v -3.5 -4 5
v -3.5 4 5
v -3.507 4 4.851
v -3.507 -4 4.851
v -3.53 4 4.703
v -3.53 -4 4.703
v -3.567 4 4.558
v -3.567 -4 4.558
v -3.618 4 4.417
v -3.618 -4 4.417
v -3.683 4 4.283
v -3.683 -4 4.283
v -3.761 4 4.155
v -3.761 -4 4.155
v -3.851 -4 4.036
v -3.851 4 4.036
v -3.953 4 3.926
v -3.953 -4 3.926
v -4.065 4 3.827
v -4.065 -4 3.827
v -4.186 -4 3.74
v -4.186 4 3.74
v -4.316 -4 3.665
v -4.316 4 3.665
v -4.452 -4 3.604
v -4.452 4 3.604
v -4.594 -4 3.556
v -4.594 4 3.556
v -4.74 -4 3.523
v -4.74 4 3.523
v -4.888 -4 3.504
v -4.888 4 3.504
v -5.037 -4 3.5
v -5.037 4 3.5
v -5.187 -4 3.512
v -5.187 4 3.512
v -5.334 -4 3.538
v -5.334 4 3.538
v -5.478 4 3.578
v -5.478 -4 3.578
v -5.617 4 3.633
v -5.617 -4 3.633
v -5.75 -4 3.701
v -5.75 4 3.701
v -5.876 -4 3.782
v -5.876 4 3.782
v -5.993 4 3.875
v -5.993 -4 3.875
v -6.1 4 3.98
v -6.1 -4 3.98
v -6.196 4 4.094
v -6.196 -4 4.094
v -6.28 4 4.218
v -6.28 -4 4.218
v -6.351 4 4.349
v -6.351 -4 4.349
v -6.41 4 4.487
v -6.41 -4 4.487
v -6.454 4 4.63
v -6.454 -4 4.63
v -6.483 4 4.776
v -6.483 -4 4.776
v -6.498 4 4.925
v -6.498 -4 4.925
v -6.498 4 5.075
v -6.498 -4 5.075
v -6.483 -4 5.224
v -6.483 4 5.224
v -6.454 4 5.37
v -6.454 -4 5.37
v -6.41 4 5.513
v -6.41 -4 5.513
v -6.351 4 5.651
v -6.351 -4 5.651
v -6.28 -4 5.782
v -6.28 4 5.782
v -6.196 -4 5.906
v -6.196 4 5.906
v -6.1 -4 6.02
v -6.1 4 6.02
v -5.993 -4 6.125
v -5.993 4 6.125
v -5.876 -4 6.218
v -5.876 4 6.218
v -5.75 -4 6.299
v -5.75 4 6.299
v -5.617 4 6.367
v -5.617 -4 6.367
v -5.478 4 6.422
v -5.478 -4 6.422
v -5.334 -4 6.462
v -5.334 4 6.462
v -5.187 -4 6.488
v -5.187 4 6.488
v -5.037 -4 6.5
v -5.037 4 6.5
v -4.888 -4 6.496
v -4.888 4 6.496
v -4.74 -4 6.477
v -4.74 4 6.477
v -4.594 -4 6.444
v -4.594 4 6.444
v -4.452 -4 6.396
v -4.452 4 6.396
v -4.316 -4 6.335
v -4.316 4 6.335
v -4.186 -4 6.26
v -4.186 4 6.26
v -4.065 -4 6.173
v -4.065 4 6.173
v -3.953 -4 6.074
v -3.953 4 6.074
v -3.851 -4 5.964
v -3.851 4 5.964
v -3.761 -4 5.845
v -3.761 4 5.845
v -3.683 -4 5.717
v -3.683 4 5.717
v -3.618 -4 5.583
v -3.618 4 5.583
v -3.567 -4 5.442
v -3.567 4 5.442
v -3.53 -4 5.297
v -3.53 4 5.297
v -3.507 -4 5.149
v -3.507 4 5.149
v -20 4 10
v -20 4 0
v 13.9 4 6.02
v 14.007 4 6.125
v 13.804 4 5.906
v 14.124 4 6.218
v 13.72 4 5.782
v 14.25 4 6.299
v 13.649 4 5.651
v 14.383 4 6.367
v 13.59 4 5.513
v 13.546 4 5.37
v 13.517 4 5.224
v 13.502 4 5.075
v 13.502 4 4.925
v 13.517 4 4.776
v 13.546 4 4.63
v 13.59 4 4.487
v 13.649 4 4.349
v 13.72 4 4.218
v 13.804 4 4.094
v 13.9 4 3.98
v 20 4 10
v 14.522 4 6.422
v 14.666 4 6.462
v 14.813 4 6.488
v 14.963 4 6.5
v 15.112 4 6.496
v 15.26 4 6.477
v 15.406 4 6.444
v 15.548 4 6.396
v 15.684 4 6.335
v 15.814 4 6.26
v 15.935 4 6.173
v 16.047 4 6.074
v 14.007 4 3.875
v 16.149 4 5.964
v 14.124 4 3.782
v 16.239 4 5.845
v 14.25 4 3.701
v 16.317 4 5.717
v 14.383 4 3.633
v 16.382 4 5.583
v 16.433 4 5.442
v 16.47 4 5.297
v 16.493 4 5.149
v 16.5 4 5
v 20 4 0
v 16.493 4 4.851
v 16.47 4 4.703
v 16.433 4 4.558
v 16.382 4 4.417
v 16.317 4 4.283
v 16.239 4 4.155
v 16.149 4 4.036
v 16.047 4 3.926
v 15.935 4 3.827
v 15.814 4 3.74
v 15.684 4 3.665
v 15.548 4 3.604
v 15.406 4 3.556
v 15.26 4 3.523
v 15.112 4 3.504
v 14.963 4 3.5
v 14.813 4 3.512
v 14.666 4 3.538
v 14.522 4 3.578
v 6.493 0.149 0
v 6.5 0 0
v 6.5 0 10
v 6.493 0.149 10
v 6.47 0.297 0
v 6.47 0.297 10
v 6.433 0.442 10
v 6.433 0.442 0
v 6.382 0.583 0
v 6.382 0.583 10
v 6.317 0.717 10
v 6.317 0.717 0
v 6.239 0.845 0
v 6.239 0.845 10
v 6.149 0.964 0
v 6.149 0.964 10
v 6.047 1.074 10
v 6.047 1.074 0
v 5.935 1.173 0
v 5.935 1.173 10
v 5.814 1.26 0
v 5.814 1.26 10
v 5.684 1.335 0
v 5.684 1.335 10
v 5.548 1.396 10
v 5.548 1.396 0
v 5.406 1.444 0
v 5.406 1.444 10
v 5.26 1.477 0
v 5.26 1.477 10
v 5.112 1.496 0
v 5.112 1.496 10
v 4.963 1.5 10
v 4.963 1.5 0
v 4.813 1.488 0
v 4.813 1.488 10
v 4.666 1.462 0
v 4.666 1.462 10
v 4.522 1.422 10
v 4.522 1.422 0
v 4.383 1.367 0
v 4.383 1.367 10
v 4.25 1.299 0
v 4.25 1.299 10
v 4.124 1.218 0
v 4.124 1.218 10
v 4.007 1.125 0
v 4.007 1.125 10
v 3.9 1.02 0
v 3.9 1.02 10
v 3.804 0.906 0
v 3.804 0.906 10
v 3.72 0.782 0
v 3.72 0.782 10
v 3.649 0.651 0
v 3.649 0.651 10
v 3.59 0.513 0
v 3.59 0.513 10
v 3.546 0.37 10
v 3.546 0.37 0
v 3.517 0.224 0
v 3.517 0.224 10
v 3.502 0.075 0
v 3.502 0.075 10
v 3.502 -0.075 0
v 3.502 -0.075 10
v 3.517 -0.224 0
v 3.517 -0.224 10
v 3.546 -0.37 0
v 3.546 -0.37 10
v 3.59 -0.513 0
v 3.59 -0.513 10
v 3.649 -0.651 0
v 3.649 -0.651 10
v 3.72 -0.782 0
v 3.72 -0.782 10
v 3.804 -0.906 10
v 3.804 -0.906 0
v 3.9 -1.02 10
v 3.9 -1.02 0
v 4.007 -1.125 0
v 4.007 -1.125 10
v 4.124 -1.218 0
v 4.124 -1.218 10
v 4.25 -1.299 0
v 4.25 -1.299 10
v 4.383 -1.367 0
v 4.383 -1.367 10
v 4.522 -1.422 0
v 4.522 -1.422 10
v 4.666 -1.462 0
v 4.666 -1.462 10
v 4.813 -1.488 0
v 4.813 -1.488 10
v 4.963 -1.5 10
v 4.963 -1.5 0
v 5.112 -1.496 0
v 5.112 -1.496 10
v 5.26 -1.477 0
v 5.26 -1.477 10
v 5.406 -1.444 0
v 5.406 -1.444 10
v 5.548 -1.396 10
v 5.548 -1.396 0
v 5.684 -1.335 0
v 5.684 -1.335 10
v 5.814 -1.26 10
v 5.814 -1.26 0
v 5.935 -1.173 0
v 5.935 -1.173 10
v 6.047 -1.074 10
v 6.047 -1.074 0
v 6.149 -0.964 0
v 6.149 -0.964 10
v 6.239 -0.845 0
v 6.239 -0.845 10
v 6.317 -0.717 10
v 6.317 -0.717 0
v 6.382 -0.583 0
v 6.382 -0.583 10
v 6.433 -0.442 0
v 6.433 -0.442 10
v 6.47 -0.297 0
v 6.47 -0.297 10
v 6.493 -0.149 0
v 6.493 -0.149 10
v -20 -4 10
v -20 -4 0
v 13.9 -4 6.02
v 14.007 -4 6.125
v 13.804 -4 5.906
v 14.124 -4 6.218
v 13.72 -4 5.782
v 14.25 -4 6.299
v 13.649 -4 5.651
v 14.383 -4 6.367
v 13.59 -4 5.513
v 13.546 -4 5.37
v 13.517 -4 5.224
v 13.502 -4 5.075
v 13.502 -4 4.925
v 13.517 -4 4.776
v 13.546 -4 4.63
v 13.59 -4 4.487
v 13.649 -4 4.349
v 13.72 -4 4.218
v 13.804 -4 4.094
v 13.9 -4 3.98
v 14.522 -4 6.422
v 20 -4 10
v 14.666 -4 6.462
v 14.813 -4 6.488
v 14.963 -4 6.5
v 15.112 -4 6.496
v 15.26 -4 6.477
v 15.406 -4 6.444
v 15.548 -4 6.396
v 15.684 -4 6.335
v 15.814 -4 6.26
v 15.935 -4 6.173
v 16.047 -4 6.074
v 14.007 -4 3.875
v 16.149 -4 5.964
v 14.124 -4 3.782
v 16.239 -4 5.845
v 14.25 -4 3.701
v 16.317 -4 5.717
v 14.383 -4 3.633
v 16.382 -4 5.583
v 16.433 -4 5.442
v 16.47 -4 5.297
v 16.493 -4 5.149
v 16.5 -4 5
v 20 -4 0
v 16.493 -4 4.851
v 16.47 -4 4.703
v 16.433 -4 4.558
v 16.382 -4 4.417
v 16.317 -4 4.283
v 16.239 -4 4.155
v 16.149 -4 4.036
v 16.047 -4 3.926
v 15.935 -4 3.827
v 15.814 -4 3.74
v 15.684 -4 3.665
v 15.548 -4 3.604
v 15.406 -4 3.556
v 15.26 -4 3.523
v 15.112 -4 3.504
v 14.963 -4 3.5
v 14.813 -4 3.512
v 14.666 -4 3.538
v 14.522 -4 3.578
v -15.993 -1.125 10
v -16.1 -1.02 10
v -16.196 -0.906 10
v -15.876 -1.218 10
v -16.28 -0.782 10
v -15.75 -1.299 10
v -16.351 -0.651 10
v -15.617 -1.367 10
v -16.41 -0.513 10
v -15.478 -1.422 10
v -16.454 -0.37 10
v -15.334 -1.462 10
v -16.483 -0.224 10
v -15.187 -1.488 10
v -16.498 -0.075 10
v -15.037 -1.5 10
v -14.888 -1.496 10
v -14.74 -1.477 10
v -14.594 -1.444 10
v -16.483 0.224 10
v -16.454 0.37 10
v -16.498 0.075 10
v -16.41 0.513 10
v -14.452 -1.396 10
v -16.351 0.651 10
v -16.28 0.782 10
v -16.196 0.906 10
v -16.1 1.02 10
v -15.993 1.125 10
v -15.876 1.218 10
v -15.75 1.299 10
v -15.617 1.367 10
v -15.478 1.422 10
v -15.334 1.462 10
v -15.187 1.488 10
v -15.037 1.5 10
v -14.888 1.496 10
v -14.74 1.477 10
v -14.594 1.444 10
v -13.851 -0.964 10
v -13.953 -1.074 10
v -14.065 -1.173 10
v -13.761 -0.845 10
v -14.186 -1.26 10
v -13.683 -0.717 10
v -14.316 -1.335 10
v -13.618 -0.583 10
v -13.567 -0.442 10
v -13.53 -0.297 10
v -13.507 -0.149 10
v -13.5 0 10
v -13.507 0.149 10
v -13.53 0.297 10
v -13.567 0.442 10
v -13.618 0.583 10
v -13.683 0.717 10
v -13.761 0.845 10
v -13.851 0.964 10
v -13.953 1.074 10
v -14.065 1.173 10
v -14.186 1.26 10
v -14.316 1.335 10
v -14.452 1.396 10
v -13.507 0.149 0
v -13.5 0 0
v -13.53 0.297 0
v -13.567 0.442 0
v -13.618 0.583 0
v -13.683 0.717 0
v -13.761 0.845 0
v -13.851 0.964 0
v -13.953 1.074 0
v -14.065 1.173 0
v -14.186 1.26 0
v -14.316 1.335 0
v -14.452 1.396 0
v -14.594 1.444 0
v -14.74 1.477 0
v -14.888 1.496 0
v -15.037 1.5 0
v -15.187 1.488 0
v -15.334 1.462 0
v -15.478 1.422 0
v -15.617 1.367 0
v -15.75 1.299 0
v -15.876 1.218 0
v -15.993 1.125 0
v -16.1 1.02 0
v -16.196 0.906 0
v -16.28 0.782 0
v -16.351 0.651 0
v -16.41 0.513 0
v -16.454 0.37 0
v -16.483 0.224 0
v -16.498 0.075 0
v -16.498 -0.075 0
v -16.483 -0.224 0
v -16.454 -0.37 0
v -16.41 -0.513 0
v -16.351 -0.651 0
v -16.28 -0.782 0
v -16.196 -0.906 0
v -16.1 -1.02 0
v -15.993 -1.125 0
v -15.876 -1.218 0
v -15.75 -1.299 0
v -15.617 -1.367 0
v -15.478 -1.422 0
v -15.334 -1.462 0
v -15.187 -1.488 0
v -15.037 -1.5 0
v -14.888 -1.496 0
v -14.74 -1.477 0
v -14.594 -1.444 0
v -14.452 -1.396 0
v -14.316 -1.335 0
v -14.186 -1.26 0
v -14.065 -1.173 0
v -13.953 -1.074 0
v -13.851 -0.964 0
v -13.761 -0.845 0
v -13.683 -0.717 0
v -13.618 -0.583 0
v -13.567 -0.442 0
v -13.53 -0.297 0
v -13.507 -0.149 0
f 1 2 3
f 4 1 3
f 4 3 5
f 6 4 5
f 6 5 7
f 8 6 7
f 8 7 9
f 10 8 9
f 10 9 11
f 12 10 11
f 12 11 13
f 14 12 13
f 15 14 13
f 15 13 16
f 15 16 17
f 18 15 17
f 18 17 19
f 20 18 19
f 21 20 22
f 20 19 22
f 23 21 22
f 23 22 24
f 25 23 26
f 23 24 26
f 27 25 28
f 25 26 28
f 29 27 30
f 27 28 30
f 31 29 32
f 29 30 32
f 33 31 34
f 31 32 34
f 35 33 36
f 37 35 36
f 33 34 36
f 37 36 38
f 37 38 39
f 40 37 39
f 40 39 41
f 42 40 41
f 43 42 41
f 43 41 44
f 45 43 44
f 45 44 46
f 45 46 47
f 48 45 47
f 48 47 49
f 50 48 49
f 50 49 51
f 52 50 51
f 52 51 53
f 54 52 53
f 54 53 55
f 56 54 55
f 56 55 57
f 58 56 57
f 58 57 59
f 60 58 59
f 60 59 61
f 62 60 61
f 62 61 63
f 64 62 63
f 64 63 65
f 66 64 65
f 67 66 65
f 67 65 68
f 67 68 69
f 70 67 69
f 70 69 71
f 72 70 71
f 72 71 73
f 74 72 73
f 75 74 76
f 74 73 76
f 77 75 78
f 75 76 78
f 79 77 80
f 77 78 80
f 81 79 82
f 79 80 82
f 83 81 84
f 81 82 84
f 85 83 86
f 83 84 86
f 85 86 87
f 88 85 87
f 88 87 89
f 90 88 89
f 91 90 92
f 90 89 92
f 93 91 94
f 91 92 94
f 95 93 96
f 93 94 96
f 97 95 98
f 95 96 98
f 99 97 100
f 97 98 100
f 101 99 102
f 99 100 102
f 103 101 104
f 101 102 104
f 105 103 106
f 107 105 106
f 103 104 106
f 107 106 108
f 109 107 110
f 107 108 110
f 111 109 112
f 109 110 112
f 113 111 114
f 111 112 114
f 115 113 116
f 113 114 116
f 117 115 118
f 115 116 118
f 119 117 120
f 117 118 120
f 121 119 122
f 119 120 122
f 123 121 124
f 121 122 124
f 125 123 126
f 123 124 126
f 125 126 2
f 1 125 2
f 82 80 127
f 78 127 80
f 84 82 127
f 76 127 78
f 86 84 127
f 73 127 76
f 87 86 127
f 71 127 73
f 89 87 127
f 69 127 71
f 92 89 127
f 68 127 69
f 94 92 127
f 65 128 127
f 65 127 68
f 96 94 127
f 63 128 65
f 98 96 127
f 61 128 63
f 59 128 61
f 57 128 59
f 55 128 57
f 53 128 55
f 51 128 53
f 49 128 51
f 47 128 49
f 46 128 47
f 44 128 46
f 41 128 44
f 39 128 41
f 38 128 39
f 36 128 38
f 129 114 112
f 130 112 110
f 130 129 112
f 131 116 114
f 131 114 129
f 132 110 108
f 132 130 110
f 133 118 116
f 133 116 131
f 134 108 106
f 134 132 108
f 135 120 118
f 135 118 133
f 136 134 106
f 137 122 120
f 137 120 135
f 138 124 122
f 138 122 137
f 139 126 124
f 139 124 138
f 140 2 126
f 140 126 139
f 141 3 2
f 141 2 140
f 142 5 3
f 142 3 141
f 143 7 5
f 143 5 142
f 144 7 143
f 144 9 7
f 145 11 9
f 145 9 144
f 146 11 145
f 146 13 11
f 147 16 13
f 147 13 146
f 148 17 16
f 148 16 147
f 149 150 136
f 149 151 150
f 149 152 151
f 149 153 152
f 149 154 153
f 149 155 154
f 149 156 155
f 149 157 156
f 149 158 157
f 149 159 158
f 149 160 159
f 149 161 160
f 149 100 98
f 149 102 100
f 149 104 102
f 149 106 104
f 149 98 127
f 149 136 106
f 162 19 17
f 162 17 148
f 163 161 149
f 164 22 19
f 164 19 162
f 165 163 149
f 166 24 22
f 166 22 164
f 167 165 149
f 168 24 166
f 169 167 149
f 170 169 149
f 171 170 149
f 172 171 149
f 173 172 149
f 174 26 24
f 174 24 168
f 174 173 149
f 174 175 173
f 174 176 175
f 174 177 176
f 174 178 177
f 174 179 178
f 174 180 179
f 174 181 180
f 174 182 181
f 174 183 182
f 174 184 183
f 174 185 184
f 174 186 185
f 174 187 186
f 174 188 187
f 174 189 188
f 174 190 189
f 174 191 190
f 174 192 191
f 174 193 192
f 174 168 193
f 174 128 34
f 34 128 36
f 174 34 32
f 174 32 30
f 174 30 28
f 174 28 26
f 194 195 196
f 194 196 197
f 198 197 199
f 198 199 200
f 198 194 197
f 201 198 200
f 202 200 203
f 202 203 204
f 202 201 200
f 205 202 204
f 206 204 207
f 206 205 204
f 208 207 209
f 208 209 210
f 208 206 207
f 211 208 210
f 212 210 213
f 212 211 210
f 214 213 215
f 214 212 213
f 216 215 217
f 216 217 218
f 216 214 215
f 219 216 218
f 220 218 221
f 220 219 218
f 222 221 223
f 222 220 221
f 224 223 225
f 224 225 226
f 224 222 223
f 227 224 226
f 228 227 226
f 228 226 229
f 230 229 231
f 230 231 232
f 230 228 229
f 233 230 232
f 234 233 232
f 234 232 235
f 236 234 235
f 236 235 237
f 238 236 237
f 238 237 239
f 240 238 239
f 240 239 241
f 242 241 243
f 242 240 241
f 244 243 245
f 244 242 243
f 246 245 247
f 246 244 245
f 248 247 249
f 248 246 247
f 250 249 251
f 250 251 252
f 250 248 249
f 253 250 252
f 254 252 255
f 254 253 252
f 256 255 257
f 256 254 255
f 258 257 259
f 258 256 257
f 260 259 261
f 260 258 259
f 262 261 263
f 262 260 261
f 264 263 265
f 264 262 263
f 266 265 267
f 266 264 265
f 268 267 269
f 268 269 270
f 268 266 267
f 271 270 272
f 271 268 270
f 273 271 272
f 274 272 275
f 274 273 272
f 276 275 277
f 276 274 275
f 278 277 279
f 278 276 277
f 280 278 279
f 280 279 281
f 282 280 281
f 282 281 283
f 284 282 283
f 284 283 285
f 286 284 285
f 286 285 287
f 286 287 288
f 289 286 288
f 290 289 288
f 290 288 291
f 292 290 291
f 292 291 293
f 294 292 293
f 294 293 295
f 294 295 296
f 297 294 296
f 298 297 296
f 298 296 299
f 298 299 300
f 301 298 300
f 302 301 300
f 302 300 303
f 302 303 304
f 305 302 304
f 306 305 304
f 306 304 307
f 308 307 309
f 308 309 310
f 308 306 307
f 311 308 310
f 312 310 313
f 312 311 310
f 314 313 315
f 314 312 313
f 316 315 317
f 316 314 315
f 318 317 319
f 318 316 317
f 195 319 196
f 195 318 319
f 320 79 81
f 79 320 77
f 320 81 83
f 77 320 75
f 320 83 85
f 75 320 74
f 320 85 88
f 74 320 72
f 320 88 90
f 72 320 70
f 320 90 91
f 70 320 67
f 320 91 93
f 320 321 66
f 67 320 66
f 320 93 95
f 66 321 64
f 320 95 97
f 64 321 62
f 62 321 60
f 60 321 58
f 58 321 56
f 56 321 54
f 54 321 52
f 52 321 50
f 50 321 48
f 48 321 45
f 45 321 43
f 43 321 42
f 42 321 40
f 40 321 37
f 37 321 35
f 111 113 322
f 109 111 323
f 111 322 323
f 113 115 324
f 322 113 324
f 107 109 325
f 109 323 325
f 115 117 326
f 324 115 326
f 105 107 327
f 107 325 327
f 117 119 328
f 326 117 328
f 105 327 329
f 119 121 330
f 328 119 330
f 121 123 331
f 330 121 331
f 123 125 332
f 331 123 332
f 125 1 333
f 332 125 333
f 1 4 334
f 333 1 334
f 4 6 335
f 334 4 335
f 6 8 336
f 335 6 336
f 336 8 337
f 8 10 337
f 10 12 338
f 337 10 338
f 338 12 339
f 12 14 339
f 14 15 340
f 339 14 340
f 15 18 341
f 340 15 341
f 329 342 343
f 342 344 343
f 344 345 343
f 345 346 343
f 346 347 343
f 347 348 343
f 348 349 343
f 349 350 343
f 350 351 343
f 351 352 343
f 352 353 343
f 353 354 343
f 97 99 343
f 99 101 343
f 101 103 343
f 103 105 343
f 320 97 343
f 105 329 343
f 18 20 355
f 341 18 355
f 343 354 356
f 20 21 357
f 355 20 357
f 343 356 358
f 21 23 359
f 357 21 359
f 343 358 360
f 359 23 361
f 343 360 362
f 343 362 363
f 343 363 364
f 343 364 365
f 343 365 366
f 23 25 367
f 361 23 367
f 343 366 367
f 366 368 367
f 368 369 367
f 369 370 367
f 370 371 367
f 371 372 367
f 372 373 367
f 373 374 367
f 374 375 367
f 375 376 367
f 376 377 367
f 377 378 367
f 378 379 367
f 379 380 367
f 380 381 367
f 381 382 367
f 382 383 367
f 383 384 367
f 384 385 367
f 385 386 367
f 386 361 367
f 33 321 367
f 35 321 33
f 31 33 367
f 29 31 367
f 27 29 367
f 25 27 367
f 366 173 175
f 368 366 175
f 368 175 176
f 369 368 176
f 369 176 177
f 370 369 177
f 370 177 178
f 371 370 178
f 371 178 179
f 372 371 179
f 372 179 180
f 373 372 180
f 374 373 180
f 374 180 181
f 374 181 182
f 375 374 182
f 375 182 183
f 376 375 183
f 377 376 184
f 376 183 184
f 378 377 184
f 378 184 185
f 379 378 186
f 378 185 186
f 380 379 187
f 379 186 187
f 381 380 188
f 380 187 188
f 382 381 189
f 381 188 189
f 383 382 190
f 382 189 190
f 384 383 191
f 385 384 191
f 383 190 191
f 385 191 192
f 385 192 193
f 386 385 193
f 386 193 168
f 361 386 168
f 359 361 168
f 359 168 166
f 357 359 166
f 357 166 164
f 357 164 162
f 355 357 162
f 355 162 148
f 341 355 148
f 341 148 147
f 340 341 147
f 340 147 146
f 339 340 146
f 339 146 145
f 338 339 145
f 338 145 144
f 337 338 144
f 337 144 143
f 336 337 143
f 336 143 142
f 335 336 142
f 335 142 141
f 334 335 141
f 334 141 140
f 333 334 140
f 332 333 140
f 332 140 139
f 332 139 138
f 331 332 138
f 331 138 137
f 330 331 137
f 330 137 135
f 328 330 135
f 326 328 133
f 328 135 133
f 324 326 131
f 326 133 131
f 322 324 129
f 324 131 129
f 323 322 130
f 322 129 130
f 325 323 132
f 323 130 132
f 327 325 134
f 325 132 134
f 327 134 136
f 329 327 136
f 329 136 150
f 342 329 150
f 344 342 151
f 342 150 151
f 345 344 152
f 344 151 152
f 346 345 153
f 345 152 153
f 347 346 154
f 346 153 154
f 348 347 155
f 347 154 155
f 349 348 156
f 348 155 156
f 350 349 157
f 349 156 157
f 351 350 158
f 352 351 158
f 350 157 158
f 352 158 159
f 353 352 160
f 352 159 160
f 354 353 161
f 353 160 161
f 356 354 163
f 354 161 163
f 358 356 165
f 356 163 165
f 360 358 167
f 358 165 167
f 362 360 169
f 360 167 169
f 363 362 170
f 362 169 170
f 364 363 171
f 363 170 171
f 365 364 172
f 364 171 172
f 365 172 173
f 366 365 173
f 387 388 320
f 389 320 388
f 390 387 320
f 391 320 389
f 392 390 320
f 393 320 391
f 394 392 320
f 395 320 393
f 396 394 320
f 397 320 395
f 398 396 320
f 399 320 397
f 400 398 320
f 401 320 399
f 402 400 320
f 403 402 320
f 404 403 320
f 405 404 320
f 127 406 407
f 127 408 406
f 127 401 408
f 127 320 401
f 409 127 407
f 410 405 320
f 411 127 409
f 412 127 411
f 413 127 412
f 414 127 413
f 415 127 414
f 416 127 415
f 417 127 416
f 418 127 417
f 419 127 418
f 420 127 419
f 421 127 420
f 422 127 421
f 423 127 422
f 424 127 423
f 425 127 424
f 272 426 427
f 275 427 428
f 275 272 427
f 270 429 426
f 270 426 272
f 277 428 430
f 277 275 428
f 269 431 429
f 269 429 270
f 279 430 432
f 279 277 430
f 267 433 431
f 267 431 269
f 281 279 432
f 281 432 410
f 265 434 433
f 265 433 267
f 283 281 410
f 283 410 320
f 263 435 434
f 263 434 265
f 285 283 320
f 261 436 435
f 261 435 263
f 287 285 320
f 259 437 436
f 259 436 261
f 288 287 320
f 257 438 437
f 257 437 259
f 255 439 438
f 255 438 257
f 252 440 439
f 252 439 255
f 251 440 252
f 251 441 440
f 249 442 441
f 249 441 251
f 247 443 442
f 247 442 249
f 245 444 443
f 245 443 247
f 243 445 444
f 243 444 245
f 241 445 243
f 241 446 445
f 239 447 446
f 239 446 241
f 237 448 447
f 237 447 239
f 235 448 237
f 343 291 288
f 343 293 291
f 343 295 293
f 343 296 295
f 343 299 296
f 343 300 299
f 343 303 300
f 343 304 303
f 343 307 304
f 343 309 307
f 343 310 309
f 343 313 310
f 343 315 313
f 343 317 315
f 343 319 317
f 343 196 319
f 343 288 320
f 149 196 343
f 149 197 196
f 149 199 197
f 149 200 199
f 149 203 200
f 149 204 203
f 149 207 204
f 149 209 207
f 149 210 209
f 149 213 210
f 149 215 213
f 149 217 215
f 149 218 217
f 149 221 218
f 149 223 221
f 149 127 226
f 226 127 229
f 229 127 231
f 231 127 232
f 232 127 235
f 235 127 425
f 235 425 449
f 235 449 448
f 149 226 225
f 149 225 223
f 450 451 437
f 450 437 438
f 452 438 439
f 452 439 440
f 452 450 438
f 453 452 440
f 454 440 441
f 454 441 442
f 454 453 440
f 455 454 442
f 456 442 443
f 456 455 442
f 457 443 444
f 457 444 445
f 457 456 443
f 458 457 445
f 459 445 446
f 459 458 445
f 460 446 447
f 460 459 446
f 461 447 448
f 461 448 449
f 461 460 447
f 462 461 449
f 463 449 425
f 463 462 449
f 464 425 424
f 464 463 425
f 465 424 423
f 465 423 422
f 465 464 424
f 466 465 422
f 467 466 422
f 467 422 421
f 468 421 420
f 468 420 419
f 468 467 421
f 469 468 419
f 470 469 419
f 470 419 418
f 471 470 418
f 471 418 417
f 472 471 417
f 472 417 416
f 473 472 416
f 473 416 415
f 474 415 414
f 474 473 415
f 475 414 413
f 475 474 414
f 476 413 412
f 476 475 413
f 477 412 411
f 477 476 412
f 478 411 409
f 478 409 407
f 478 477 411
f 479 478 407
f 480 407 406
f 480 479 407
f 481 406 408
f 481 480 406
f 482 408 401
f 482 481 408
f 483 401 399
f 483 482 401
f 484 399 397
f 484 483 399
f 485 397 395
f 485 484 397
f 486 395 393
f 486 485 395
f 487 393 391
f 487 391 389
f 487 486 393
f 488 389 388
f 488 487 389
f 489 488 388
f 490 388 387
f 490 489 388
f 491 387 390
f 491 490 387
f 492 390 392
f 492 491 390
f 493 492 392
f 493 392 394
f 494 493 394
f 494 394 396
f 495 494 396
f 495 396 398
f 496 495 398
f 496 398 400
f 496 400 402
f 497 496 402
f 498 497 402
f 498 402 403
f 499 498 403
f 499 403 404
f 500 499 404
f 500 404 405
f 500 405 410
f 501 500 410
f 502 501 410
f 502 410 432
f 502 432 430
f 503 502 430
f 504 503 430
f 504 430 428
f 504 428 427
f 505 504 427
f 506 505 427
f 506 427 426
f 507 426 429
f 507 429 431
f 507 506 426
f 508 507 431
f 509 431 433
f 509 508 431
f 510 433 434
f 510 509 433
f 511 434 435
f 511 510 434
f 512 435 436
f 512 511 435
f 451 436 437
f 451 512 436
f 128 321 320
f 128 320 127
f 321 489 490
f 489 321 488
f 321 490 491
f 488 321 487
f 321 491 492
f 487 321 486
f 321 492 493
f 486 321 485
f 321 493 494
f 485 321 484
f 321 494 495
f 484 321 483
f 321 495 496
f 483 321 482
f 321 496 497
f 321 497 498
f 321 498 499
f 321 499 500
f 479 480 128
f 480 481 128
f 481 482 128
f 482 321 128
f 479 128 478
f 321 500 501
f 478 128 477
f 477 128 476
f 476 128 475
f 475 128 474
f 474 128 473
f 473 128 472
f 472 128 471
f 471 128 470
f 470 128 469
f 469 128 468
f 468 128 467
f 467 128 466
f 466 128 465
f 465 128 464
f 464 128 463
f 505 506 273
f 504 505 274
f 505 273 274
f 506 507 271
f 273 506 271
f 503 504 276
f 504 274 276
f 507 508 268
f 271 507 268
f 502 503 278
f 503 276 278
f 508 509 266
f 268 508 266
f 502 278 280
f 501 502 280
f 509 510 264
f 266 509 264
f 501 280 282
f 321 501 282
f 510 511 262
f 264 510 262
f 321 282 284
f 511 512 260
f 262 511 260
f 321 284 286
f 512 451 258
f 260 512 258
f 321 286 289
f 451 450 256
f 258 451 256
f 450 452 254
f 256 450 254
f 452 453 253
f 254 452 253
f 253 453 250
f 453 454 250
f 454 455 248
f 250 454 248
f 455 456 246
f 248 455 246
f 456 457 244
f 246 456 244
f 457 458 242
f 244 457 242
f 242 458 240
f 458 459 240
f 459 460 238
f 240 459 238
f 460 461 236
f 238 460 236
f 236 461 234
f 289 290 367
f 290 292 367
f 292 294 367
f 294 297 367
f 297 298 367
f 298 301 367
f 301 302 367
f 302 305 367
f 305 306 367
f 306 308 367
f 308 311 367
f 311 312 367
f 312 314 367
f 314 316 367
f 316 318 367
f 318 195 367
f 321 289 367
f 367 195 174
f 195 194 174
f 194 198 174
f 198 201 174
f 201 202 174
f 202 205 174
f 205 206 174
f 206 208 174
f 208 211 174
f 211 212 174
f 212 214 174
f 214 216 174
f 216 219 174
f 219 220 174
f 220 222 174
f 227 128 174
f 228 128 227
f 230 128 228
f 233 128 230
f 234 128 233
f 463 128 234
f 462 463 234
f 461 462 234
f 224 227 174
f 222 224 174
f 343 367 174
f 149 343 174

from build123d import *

# Parameters (mm, degrees)
SKETCH_1_W          = 40
SKETCH_1_H          = 8
SKETCH_1_R          = 1.5
EXTRUDE_1_DEPTH     = 10
SKETCH_2_R          = 1.5
CUT_EXTRUDE_5_DEPTH = 9


with BuildPart() as part:
    # 草图1 → 凸台-拉伸1 (new body)
    with BuildSketch(Plane.XY):
        Rectangle(SKETCH_1_W, SKETCH_1_H)
        with Locations((-15, 0)):
            Circle(SKETCH_1_R, mode=Mode.SUBTRACT)
        with Locations((5, 0)):
            Circle(SKETCH_1_R, mode=Mode.SUBTRACT)
    extrude(amount=EXTRUDE_1_DEPTH)

    # 草图2 → 切除-拉伸5 (cut, through all)
    with BuildSketch(Plane(origin=(0, 4, 0), x_dir=(1, 0, 0), z_dir=(0, 1, 0))):
        with Locations((15, -5)):
            Circle(SKETCH_2_R)
        with Locations((-5, -5)):
            Circle(SKETCH_2_R)
    extrude(amount=-CUT_EXTRUDE_5_DEPTH, mode=Mode.SUBTRACT)


solid = part.part
